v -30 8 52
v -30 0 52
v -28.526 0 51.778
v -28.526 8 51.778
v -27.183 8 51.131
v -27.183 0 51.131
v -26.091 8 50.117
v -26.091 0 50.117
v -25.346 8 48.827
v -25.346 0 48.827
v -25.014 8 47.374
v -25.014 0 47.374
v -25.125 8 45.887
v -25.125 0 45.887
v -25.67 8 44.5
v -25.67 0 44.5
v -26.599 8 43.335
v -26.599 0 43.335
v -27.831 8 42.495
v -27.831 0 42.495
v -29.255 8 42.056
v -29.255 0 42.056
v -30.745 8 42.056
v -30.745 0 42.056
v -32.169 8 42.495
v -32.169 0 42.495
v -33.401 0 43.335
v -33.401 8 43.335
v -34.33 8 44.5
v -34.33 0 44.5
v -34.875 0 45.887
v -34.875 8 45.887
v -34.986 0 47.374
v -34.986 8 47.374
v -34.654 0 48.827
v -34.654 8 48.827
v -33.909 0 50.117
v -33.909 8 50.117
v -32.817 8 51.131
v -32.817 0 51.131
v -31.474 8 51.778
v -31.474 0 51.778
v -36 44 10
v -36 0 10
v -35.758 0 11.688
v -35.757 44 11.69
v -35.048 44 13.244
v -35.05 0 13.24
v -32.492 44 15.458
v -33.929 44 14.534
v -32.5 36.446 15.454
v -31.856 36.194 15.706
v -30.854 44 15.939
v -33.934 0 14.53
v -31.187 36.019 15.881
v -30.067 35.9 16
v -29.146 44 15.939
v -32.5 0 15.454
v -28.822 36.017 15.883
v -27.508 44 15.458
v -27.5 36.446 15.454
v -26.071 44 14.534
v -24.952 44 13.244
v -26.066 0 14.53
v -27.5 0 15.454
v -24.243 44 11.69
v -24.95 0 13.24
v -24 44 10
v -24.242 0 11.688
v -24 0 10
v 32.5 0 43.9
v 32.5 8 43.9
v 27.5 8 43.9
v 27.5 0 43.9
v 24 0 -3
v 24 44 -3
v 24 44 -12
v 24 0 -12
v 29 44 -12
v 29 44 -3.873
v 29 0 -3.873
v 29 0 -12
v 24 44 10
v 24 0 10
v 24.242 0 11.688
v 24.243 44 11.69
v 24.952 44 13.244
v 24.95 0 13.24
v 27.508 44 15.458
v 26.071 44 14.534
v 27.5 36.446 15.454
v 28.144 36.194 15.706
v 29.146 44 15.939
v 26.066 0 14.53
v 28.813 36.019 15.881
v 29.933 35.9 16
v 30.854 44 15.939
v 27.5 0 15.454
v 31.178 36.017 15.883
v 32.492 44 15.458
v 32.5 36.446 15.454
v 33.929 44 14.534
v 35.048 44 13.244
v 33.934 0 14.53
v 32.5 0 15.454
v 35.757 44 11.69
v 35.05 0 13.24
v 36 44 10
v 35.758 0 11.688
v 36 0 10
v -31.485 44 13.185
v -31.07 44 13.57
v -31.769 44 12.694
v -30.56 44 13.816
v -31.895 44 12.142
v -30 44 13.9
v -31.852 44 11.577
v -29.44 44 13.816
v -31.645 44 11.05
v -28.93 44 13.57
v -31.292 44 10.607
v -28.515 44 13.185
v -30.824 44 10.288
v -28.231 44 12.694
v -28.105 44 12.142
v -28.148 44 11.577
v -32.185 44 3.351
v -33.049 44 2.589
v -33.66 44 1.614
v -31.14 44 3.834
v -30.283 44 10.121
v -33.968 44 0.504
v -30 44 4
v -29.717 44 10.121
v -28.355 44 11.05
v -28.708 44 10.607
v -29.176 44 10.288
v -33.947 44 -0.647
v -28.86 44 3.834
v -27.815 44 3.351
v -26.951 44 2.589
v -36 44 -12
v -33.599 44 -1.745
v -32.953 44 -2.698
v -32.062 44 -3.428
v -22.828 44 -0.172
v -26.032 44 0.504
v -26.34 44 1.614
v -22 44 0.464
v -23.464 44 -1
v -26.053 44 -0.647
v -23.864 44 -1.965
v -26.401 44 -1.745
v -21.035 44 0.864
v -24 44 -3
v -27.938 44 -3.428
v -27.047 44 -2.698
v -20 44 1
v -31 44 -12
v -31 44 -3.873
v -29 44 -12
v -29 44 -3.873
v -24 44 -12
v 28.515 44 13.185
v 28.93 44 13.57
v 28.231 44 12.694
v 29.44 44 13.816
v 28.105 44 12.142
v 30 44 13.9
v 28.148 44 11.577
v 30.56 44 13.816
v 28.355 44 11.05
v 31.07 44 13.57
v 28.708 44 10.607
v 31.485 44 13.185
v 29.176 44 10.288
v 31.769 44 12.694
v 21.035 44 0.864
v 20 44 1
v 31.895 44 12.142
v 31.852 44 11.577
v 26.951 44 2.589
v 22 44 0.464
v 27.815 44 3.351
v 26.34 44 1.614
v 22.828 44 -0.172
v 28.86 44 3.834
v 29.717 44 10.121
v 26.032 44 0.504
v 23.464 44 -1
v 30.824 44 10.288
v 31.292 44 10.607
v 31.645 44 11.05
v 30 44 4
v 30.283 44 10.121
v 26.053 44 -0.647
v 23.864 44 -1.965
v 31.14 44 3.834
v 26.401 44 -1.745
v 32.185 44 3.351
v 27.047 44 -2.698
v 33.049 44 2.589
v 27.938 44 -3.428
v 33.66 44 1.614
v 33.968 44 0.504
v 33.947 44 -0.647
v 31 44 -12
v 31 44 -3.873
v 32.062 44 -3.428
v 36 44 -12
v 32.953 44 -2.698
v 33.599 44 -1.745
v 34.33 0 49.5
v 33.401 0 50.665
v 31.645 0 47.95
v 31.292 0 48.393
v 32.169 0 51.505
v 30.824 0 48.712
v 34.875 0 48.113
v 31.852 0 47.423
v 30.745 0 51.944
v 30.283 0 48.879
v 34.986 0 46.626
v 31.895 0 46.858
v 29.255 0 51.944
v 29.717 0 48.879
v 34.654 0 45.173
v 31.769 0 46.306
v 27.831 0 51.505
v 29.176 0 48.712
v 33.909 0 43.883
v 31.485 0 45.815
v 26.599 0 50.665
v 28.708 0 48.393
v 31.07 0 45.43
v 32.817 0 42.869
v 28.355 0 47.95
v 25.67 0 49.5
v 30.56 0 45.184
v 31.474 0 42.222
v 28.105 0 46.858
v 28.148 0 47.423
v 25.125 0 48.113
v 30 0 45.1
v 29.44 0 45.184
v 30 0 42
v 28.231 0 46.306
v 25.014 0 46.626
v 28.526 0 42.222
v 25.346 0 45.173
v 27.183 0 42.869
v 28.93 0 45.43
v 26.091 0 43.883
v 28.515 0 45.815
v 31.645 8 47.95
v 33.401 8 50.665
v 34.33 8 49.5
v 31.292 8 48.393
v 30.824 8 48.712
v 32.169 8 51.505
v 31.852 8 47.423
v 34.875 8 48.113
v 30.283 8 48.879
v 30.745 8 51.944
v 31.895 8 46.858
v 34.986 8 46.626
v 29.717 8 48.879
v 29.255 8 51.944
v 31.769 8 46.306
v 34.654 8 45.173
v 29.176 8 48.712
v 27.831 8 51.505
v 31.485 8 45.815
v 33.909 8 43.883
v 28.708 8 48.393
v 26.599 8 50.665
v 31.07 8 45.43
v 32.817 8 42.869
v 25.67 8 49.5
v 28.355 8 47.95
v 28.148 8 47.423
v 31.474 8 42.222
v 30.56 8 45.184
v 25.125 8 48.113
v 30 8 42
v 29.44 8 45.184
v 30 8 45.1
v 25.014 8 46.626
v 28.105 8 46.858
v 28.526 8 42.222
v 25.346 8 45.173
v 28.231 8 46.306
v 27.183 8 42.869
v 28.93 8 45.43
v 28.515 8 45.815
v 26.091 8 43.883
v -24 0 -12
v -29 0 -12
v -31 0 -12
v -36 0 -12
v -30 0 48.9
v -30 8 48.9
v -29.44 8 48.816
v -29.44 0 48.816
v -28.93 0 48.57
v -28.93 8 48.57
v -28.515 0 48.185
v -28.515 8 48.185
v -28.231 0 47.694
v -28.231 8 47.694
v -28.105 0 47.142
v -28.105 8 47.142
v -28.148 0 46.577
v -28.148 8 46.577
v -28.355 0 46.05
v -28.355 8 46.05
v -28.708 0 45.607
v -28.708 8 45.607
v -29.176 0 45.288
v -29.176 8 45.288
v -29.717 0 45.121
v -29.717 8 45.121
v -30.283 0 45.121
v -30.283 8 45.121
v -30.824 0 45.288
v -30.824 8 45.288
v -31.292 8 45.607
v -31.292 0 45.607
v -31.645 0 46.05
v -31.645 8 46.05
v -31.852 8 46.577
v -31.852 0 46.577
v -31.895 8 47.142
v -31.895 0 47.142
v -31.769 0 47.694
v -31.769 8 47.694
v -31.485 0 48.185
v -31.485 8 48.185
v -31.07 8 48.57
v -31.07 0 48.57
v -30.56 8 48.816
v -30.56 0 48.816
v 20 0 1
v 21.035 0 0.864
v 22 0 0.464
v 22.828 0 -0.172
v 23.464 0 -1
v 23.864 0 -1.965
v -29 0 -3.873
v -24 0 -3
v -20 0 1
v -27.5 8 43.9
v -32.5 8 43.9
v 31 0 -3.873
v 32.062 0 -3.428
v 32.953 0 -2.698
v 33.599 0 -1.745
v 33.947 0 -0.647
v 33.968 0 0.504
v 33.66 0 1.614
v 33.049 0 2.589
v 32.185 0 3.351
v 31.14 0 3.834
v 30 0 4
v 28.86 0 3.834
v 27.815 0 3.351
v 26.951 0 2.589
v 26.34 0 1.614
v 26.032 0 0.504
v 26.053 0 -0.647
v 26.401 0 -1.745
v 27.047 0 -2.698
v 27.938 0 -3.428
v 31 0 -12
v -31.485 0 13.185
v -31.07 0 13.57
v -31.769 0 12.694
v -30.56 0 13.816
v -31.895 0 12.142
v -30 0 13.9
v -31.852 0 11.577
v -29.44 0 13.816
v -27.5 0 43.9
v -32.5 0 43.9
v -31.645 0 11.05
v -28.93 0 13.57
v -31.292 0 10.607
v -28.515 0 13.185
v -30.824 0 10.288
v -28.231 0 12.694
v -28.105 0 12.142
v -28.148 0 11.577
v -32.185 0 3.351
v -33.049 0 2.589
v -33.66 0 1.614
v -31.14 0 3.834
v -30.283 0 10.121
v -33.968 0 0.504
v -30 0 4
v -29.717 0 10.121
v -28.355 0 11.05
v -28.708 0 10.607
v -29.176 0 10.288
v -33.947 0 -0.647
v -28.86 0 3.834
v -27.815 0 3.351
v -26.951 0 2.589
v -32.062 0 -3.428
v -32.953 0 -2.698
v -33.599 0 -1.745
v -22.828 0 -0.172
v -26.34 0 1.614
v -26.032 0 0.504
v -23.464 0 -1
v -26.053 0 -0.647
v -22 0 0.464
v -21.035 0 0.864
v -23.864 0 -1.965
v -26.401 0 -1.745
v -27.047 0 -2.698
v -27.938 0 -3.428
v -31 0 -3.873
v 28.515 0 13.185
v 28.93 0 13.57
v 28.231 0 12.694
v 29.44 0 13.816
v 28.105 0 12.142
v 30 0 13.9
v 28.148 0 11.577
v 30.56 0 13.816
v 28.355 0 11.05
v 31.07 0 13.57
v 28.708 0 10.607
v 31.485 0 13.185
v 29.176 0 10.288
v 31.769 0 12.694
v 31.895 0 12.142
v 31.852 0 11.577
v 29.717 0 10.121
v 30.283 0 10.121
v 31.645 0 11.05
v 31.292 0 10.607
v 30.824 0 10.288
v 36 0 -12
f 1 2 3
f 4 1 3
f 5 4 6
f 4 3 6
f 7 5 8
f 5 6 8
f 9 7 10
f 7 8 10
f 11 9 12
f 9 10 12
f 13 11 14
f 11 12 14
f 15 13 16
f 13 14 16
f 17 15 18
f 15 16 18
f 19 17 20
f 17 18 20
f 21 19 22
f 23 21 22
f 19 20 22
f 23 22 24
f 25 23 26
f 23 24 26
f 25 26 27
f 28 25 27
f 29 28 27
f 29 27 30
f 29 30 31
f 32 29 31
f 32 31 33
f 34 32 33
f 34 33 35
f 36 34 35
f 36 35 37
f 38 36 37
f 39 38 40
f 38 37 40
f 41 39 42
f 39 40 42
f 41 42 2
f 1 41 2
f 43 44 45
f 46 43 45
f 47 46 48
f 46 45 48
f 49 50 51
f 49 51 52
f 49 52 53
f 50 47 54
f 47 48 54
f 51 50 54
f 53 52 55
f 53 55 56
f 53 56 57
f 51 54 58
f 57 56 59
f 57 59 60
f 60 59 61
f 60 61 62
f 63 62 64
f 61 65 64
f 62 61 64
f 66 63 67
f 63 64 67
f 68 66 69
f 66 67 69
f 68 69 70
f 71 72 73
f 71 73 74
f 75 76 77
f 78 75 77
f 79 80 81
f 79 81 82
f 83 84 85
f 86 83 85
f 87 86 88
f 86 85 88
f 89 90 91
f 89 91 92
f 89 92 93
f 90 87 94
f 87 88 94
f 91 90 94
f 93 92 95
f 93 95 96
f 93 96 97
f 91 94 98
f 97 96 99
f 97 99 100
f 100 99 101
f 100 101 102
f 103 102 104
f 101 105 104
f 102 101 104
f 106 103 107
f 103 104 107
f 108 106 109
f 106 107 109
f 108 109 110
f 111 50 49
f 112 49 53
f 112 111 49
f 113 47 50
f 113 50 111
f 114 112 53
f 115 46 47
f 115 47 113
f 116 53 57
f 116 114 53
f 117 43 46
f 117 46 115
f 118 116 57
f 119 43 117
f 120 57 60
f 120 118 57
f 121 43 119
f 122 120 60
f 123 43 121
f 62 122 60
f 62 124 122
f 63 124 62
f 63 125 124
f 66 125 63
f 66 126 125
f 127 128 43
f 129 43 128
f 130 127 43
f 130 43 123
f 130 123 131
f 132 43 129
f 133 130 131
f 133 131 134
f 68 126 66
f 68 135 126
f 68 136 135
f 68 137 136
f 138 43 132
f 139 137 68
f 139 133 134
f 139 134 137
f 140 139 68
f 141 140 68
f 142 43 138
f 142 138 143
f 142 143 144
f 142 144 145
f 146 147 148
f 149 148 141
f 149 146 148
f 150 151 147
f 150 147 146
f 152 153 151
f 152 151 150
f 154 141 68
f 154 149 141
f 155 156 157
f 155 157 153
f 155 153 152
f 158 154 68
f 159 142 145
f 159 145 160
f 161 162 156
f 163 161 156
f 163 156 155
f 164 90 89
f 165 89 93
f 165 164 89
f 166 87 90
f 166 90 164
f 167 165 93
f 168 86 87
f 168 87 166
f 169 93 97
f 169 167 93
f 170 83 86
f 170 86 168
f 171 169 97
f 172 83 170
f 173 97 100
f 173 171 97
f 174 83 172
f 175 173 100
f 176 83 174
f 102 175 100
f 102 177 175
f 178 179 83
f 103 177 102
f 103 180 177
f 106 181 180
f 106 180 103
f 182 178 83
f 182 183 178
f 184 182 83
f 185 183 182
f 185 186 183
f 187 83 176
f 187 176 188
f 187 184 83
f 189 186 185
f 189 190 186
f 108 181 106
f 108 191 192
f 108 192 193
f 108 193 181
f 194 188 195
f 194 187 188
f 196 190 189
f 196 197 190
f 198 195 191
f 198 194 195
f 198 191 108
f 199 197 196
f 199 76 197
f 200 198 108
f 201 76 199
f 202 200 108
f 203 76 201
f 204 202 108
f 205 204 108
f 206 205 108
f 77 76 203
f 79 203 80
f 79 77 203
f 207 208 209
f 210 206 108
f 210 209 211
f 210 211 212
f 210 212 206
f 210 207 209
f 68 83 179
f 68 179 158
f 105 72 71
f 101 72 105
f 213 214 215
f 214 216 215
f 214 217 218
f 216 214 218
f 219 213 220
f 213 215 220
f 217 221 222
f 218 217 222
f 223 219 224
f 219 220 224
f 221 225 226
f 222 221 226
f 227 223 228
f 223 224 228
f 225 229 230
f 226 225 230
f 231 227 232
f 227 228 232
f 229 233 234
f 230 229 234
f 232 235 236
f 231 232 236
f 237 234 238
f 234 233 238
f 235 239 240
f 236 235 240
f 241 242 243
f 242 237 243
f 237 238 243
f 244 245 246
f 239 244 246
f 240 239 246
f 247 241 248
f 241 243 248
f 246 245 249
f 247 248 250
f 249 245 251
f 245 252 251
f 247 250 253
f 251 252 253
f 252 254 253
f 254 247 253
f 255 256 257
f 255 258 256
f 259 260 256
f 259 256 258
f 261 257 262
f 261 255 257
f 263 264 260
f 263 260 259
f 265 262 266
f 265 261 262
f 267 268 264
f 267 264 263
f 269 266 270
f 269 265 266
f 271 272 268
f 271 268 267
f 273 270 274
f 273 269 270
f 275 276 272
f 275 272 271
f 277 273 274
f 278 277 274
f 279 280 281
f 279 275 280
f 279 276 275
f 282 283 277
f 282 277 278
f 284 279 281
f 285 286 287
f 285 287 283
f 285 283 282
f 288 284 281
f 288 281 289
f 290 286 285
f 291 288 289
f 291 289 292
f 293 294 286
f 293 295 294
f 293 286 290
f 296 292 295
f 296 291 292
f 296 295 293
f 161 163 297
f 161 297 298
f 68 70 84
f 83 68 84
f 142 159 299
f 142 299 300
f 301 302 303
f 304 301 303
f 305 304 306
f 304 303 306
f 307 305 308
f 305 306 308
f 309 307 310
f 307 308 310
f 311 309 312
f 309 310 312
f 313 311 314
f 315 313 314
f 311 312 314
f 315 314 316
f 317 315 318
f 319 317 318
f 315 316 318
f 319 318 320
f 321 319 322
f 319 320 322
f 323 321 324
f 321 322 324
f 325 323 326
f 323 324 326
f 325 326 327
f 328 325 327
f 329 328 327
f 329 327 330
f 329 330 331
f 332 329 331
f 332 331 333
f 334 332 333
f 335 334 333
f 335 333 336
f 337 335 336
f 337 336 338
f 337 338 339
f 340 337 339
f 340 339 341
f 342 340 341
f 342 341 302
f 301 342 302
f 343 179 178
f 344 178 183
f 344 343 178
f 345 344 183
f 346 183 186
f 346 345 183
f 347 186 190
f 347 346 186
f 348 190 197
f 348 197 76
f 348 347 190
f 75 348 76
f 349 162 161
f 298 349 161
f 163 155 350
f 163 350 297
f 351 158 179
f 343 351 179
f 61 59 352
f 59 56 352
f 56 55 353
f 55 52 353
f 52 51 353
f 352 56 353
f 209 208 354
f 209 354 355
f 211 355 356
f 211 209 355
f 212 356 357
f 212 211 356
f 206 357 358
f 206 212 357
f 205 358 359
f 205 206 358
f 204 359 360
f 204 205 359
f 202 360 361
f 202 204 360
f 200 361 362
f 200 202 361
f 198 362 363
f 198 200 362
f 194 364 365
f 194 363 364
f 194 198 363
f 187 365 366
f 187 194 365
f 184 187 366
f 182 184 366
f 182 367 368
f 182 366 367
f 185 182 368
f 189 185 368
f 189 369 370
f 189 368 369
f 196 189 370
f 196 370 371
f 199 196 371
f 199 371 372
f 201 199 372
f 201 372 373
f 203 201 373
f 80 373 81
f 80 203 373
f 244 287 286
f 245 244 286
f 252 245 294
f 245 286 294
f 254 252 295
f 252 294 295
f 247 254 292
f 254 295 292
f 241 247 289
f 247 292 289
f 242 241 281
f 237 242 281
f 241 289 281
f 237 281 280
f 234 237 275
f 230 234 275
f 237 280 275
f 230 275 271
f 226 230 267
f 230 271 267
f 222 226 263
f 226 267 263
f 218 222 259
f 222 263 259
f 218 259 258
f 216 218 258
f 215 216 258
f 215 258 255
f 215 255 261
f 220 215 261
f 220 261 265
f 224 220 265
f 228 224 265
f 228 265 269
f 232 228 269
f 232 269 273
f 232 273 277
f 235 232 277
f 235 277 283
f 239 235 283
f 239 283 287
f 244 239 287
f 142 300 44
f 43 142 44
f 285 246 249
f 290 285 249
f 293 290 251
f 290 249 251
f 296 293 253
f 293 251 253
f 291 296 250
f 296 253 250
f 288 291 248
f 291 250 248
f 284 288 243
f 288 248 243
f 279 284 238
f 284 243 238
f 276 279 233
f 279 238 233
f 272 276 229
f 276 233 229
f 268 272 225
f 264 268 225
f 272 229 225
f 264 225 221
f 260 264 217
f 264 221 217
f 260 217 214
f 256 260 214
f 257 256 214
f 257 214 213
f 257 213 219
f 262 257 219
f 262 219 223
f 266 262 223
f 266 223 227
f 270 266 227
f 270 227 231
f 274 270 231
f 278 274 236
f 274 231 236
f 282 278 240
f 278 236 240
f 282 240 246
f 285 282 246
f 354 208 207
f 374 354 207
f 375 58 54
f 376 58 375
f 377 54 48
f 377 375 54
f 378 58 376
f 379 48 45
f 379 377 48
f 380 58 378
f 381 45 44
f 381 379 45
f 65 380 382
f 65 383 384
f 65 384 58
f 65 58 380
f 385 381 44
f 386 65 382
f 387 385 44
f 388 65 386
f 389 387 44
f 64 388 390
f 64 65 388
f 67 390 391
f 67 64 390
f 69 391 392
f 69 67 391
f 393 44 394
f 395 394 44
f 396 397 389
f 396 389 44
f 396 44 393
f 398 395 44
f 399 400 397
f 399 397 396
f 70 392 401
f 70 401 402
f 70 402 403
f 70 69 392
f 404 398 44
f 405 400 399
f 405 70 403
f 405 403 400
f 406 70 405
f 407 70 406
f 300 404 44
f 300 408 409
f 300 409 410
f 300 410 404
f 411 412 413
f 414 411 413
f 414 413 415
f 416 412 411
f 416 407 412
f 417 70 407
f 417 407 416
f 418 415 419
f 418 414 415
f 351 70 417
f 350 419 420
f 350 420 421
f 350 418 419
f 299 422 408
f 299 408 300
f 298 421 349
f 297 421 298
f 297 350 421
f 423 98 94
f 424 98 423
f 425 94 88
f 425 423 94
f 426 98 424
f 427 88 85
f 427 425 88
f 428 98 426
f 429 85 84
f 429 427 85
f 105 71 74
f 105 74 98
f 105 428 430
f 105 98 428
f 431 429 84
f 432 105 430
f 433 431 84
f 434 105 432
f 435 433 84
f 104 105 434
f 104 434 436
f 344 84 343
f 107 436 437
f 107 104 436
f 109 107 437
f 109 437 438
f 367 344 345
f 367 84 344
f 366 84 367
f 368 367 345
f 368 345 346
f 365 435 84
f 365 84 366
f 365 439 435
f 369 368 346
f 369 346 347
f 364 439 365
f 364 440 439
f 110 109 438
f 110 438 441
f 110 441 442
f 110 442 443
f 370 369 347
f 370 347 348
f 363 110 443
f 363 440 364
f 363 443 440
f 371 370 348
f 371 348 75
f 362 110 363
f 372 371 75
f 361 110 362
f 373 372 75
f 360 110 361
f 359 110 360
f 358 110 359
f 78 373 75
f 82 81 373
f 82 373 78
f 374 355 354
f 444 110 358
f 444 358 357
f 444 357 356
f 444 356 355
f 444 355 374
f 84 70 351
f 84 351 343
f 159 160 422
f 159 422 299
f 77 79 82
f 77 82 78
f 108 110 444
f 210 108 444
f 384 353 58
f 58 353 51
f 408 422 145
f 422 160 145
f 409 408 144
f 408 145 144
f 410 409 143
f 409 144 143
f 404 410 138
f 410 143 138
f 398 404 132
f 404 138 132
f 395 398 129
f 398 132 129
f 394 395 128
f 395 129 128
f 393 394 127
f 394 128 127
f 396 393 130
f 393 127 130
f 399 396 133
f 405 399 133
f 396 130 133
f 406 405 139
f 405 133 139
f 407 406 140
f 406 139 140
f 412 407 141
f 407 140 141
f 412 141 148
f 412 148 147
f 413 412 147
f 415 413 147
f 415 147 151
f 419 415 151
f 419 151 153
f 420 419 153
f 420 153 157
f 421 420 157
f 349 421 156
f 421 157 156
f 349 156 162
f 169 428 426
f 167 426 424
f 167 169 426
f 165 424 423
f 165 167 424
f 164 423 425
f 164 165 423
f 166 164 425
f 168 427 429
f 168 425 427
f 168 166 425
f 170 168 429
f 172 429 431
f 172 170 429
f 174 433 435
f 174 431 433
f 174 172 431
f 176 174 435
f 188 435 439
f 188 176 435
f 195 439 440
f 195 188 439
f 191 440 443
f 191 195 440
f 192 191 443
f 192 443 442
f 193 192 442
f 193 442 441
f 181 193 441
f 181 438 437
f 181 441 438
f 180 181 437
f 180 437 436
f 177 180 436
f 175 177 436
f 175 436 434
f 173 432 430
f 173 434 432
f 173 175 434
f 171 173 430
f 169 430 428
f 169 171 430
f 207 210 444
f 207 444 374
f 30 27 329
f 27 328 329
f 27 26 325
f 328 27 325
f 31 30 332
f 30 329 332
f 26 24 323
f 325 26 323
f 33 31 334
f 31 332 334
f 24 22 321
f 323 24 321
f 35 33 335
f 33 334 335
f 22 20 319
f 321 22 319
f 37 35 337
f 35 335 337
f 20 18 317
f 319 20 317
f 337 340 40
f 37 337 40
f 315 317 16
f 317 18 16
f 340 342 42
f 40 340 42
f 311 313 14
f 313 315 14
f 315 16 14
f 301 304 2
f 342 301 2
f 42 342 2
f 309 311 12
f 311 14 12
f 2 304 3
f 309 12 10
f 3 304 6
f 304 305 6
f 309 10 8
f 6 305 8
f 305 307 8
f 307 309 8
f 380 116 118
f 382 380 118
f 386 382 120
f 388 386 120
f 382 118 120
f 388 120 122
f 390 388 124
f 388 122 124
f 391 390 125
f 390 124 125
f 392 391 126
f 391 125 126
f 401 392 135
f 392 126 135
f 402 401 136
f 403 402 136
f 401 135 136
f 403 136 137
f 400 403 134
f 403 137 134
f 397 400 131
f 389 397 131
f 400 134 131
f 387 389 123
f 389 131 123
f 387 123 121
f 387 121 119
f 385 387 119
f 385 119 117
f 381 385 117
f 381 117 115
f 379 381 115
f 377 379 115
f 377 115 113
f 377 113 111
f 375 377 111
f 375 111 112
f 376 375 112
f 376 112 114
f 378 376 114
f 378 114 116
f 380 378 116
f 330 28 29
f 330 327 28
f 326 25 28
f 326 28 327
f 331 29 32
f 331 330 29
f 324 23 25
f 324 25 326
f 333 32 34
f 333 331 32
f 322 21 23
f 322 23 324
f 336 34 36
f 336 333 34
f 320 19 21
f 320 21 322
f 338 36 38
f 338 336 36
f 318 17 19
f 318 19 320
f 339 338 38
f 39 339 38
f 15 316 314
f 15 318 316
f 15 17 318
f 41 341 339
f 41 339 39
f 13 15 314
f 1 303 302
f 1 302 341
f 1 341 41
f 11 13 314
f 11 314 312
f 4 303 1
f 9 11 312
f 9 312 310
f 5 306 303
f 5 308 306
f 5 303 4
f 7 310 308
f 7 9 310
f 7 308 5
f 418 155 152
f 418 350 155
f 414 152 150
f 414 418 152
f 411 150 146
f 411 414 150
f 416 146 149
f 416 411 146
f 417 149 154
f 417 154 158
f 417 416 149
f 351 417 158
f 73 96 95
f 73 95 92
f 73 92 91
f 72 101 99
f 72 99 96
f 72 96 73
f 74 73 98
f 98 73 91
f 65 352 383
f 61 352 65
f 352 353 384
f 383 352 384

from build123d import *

# Parameters (mm, degrees)
BOSS_EXTRUDE1_DEPTH   = 44
SKETCH3_R             = 4
SKETCH3_R_2           = 1.9
CUT_EXTRUDE1_DEPTH    = 60.059292241
SKETCH4_W             = 2
SKETCH4_H             = 12
CUT_EXTRUDE2_DEPTH    = 60.059292241
SKETCH5_W             = 48
SKETCH5_H             = 13
CUT_EXTRUDE3_DEPTH    = 60.059292241
FILLET1_R             = 4
BOSS_EXTRUDE5_DEPTH   = 2.5
SKETCH6_R             = 5
BOSS_EXTRUDE2_DEPTH   = 8
BOSS_EXTRUDE2_2_DEPTH = 8
SKETCH7_R             = 1.9
CUT_EXTRUDE5_DEPTH    = 73.773621595


with BuildPart() as part:
    # Sketch1 → Boss-Extrude1 (new body)
    with BuildSketch(Plane(origin=(0, 0, 0), x_dir=(1, 0, 0), z_dir=(0, 1, 0))):
        with BuildLine():
            Line((-24, -10), (24, -10))
            ThreePointArc((24, -10), (30, -16), (36, -10))
            Line((36, -10), (36, 12))
            Line((36, 12), (-36, 12))
            Line((-36, 12), (-36, -10))
            ThreePointArc((-36, -10), (-30, -16), (-24, -10))
        make_face()
    extrude(amount=BOSS_EXTRUDE1_DEPTH)

    # Sketch3 → Cut-Extrude1 (cut, through all)
    with BuildSketch(Plane(origin=(0, 44, 0), x_dir=(1, 0, 0), z_dir=(0, 1, 0))):
        with Locations(Location((-30, 0, 0), (0, 0, 270))):
            Circle(SKETCH3_R)
        with Locations(Location((-30, -12, 0), (0, 0, 270))):
            Circle(SKETCH3_R_2)
    cut_extrude1 = extrude(amount=-CUT_EXTRUDE1_DEPTH, mode=Mode.SUBTRACT)

    # Sketch4 → Cut-Extrude2 (cut, through all)
    with BuildSketch(Plane(origin=(0, 44, 0), x_dir=(1, 0, 0), z_dir=(0, 1, 0))):
        with Locations((-30, 6)):
            Rectangle(SKETCH4_W, SKETCH4_H)
    cut_extrude2 = extrude(amount=-CUT_EXTRUDE2_DEPTH, mode=Mode.SUBTRACT)

    # Mirror1: Cut-Extrude1, Cut-Extrude2 across plane
    add(cut_extrude1.mirror(Plane(origin=(0, 0, 0), x_dir=(0, 0, 1), z_dir=(1, 0, 0))), mode=Mode.SUBTRACT)
    add(cut_extrude2.mirror(Plane(origin=(0, 0, 0), x_dir=(0, 0, 1), z_dir=(1, 0, 0))), mode=Mode.SUBTRACT)

    # Sketch5 → Cut-Extrude3 (cut, through all)
    with BuildSketch(Plane(origin=(0, 44, 0), x_dir=(1, 0, 0), z_dir=(0, 1, 0))):
        with Locations((0, 5.5)):
            Rectangle(SKETCH5_W, SKETCH5_H)
    extrude(amount=-CUT_EXTRUDE3_DEPTH, mode=Mode.SUBTRACT)

    # Fillet1
    fillet1_edges = [part.edges().sort_by_distance(p)[0] for p in [
        (24, 22, 1),
        (-24, 22, 1),
    ]]
    fillet(fillet1_edges, radius=FILLET1_R)

    # Sketch8 → Boss-Extrude5 (add, symmetric)
    with BuildSketch(Plane.ZY.offset(30)):
        Polygon((43.9, 0), (13.9, 0), (13.9, 38), (43.9, 8), align=None)
    boss_extrude5 = extrude(amount=BOSS_EXTRUDE5_DEPTH, both=True)

    # Mirror7: Boss-Extrude5 across plane
    add(boss_extrude5.mirror(Plane(origin=(0, 0, 0), x_dir=(0, 0, 1), z_dir=(1, 0, 0))))


with BuildPart() as body_2:
    # Sketch6 → Boss-Extrude2 (new body)
    with BuildSketch(Plane(origin=(0, 0, 0), x_dir=(1, 0, 0), z_dir=(0, 1, 0))):
        with Locations(Location((-30, -47, 0), (0, 0, 270))):
            Circle(SKETCH6_R)
    extrude(amount=BOSS_EXTRUDE2_DEPTH)


with BuildPart() as body_3:
    # Sketch6 → Boss-Extrude2 2 (new body)
    with BuildSketch(Plane(origin=(0, 0, 0), x_dir=(1, 0, 0), z_dir=(0, 1, 0))):
        with Locations(Location((30, -47, 0), (0, 0, 90))):
            Circle(SKETCH6_R)
    extrude(amount=BOSS_EXTRUDE2_2_DEPTH)


with BuildPart() as cut_extrude5_tool:
    # Sketch7 → Cut-Extrude5 (new, through all)
    with BuildSketch(Plane(origin=(0, 8, 0), x_dir=(1, 0, 0), z_dir=(0, 1, 0))):
        with Locations(Location((-30, -47, 0), (0, 0, 270))):
            Circle(SKETCH7_R)
        with Locations(Location((30, -47, 0), (0, 0, 90))):
            Circle(SKETCH7_R)
    extrude(amount=-CUT_EXTRUDE5_DEPTH)


with BuildPart() as body_2_1:
    add(body_2.part)

    # Cut-Extrude5: cut by cut_extrude5_tool
    add(cut_extrude5_tool.part, mode=Mode.SUBTRACT)


with BuildPart() as body_3_1:
    add(body_3.part)

    # Cut-Extrude5: cut by cut_extrude5_tool
    add(cut_extrude5_tool.part, mode=Mode.SUBTRACT)


solid = Compound([part.part, body_2_1.part, body_3_1.part])
